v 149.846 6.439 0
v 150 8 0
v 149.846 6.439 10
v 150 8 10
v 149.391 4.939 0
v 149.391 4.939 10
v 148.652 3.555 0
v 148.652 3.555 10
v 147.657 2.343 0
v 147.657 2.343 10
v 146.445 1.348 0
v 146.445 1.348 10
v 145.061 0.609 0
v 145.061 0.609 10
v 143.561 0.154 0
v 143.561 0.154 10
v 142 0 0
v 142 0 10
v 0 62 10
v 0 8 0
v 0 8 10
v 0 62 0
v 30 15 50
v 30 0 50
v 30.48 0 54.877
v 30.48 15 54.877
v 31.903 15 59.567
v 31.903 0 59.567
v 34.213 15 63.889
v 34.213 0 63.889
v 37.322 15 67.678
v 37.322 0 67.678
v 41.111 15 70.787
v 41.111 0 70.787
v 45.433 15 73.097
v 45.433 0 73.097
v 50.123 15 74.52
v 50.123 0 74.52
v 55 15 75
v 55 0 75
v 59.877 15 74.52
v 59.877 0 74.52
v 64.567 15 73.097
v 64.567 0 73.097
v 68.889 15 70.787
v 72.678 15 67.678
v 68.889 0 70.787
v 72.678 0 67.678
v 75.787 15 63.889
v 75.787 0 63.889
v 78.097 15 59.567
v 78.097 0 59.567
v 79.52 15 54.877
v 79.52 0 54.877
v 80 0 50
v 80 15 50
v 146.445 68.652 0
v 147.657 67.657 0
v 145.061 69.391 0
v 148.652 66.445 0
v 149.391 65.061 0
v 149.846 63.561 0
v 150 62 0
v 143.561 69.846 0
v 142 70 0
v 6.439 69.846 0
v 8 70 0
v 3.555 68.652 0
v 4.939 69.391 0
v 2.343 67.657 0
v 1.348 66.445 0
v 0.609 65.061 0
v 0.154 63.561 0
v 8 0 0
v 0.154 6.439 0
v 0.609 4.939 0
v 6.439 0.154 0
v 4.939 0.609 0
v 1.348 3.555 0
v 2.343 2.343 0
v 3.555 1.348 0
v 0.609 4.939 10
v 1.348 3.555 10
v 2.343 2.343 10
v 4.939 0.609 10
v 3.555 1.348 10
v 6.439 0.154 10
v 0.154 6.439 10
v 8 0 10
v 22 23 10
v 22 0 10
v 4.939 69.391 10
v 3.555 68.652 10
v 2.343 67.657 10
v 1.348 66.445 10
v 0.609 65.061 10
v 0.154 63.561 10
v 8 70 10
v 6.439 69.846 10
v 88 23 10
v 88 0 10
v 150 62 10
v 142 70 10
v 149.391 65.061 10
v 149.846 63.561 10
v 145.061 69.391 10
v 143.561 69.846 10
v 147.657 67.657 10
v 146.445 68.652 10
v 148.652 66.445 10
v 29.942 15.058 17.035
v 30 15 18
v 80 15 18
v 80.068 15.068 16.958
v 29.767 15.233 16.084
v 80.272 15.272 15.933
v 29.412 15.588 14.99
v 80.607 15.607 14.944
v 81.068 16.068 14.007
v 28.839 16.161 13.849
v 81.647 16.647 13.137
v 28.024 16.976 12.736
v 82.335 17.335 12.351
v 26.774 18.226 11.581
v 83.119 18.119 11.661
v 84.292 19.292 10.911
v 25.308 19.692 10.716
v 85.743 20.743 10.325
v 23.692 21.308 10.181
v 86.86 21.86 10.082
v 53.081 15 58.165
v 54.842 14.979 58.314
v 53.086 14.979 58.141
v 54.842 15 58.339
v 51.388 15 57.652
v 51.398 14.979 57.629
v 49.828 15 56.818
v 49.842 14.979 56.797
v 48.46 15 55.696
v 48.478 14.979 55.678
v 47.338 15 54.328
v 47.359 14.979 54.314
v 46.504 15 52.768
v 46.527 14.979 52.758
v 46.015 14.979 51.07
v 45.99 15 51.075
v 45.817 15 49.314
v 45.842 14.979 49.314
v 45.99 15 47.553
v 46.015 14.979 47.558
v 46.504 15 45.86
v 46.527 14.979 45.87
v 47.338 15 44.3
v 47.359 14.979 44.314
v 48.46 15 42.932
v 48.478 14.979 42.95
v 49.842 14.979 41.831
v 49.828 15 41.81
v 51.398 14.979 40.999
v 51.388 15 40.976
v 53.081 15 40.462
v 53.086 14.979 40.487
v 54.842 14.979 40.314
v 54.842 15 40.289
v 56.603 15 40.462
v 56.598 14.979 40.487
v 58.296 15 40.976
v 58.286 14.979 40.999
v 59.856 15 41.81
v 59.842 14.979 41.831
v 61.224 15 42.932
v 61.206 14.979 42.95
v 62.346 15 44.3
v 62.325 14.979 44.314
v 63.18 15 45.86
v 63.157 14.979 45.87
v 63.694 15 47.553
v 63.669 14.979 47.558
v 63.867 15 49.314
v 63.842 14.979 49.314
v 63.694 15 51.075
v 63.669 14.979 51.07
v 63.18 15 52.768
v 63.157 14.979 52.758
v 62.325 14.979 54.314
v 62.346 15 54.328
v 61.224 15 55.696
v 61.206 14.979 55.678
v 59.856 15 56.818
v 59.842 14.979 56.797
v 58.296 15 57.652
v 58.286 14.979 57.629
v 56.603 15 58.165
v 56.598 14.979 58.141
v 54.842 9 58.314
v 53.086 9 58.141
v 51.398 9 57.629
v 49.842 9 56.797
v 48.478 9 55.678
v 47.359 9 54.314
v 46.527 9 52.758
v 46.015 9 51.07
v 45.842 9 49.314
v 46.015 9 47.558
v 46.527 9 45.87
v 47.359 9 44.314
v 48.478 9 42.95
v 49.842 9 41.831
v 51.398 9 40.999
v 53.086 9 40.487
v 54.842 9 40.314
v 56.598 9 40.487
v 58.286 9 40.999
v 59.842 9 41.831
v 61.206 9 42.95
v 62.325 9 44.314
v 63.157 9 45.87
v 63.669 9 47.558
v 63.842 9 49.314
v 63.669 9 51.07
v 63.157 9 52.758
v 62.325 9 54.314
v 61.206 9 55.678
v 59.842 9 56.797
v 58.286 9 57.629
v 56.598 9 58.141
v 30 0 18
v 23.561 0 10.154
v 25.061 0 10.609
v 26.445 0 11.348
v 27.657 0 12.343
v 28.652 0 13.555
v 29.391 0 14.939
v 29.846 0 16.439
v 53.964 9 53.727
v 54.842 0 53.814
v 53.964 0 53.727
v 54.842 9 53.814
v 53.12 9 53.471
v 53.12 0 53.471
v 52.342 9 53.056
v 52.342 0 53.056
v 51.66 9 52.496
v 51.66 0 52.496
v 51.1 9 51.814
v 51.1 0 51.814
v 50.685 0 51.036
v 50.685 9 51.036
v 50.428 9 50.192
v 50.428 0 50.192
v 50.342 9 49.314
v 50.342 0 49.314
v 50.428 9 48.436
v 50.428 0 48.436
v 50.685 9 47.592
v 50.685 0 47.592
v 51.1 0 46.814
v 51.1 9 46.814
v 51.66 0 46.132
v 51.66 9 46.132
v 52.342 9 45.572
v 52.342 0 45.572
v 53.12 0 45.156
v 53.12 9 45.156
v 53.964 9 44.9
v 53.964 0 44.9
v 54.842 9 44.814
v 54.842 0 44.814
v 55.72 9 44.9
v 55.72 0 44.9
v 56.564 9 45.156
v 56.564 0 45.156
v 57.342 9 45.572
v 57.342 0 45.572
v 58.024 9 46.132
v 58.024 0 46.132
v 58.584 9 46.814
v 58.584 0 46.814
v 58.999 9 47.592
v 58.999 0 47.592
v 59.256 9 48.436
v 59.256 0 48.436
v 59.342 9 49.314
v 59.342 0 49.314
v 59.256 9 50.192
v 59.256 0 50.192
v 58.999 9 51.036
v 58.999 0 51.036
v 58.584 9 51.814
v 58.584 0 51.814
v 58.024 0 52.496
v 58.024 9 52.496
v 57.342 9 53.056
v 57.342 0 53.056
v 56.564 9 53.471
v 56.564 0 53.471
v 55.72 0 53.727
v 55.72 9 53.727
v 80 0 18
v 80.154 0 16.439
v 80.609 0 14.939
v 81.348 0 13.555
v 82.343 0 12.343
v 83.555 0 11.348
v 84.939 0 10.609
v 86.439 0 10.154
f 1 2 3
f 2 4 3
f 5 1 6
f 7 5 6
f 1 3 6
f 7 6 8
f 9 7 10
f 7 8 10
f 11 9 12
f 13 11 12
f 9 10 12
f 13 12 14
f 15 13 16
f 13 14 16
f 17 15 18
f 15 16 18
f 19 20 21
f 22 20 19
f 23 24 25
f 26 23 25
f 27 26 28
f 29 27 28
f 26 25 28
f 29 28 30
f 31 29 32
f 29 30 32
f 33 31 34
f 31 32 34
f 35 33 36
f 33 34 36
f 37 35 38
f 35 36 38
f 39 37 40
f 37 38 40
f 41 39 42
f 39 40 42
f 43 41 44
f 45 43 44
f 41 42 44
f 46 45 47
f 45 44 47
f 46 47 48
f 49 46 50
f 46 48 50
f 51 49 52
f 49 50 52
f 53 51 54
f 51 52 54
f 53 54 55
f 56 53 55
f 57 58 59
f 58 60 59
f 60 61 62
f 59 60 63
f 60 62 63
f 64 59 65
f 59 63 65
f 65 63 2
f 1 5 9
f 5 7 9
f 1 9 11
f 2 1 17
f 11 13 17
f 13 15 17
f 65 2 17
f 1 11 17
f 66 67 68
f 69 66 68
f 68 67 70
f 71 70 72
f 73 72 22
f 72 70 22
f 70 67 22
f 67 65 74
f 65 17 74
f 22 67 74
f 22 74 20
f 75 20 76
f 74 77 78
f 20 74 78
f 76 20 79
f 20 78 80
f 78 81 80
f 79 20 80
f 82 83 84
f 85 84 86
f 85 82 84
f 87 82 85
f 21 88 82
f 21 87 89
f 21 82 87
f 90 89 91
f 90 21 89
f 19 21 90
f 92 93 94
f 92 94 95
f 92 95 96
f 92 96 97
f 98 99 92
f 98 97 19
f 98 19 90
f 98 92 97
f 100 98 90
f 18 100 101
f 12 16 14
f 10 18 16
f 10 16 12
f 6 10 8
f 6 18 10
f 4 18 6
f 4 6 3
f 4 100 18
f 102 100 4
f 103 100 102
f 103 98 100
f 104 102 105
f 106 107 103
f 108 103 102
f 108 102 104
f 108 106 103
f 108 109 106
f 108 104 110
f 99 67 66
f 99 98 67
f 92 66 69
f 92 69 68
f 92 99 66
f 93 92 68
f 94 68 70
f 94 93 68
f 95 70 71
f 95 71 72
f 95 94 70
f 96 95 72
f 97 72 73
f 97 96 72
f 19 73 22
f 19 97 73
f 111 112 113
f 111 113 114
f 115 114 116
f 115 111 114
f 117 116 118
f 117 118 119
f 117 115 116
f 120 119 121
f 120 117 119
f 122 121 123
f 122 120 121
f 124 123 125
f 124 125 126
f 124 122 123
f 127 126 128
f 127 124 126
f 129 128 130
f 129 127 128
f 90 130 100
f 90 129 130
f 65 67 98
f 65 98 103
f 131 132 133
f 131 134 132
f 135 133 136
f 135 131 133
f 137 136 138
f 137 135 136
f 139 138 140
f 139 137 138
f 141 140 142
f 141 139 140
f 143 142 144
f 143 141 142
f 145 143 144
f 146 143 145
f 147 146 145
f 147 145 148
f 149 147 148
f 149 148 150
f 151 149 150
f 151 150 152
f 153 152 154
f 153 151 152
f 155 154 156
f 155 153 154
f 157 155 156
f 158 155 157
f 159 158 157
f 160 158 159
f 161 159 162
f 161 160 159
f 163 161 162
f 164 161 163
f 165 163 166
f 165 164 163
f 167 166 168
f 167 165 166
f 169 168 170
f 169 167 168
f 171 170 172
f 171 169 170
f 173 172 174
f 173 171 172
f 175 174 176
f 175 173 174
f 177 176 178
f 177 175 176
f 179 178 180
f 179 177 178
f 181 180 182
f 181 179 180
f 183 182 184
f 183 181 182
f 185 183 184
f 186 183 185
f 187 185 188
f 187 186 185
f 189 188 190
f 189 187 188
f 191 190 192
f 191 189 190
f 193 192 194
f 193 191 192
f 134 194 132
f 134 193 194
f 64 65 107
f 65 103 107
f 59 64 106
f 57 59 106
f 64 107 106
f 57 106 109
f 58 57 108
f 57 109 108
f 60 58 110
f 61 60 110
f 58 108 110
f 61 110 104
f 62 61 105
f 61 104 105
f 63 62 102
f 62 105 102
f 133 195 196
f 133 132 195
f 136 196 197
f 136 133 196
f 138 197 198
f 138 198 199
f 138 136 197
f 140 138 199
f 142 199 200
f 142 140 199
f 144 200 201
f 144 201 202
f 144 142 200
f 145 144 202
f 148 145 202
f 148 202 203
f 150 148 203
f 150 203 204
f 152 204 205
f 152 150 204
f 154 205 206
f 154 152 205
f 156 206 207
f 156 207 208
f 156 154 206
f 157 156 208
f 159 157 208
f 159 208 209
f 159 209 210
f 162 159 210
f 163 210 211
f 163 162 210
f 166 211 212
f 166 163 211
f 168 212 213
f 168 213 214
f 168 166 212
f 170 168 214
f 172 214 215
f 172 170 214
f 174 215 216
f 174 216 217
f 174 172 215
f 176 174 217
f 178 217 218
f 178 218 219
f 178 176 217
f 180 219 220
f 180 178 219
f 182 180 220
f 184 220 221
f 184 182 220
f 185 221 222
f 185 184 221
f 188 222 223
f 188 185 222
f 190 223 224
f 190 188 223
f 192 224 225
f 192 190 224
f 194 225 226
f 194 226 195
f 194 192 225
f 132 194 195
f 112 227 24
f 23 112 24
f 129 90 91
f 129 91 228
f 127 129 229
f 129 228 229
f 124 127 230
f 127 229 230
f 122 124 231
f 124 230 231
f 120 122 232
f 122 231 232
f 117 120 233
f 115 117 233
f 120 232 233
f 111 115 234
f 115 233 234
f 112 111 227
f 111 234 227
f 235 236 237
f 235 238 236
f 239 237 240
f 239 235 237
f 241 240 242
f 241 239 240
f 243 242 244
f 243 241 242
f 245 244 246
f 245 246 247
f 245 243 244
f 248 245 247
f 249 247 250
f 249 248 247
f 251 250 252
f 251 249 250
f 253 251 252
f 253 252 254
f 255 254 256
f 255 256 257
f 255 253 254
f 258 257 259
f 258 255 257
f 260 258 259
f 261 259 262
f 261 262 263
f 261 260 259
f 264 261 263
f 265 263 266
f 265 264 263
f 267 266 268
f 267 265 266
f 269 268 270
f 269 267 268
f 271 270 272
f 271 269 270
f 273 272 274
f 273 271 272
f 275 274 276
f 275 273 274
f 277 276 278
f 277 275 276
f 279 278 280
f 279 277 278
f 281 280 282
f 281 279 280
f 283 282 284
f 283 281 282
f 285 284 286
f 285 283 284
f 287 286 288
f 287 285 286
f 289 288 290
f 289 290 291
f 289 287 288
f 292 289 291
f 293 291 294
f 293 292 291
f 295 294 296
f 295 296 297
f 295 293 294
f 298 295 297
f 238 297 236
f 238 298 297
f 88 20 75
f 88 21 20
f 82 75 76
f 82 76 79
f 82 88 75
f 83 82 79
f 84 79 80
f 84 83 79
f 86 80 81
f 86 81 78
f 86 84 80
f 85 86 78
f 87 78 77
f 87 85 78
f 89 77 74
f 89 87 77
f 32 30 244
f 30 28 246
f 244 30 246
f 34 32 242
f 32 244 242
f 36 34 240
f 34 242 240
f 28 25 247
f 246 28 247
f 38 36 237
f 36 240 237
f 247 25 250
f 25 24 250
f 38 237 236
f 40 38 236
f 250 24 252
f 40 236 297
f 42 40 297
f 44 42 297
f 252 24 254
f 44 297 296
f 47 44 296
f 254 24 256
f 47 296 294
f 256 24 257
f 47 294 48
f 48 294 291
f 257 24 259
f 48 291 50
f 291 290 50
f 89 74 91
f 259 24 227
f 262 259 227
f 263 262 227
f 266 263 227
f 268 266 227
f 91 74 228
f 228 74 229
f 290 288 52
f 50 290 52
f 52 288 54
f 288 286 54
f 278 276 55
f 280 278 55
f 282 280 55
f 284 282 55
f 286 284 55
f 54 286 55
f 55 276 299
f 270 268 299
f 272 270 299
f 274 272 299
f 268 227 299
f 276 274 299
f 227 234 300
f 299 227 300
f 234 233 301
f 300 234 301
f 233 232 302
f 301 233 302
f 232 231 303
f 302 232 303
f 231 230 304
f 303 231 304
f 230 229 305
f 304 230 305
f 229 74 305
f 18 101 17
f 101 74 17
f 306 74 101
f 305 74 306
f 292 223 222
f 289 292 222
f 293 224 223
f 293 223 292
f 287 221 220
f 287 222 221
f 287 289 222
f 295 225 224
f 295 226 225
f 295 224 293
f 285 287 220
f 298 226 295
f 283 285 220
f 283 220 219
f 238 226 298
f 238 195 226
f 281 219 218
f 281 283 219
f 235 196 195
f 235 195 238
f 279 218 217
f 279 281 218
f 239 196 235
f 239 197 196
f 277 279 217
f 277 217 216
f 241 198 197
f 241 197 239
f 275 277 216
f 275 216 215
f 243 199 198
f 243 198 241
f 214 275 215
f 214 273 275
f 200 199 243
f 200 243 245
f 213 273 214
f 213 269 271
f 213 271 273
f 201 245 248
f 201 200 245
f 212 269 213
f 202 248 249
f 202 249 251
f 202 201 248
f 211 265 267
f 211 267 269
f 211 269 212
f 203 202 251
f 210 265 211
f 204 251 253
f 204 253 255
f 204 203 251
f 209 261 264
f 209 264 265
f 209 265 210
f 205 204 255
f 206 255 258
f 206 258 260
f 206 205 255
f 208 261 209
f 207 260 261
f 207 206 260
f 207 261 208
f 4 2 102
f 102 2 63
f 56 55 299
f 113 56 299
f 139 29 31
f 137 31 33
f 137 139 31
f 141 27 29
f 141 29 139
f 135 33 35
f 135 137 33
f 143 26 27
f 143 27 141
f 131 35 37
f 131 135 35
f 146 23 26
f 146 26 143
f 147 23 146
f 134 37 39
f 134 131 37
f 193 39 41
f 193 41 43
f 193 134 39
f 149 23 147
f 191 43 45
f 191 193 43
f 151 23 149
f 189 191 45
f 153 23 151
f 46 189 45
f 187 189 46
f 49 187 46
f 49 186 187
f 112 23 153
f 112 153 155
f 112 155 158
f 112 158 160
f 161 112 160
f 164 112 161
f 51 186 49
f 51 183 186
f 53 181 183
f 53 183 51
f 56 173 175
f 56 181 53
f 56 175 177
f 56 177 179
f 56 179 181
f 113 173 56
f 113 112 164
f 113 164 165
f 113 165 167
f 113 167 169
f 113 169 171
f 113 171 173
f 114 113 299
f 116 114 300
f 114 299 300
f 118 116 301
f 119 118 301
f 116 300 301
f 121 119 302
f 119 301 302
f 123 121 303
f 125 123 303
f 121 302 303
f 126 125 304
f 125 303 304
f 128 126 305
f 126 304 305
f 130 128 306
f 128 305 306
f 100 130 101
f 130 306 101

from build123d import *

# Parameters (mm, degrees)
SKETCH1_W           = 150
SKETCH1_H           = 70
BOSS_EXTRUDE1_DEPTH = 10
BOSS_EXTRUDE2_DEPTH = 15
FILLET1_R           = 8
FILLET2_R           = 8
FILLET3_R           = 8
FILLET4_R           = 8
FILLET5_R           = 8
FILLET6_R           = 8
FILLET11_R          = 8


with BuildPart() as part:
    # Sketch1 → Boss-Extrude1 (new body)
    with BuildSketch(Plane.XY):
        with Locations((75, 35)):
            Rectangle(SKETCH1_W, SKETCH1_H)
    extrude(amount=BOSS_EXTRUDE1_DEPTH)

    # Sketch2 → Boss-Extrude2 (add)
    with BuildSketch(Plane(origin=(0, 0, 0), x_dir=(-1, 0, 0), z_dir=(0, -1, 0))):
        with BuildLine():
            Line((-80, -50), (-80, 0))
            Line((-80, 0), (-30, 0))
            Line((-30, 0), (-30, -50))
            ThreePointArc((-30, -50), (-55, -75), (-80, -50))
        make_face()
    extrude(amount=-BOSS_EXTRUDE2_DEPTH)

    # Fillet1
    fillet1_edges = [part.edges().sort_by_distance(p)[0] for p in [
        (80, 7.5, 10),
    ]]
    fillet(fillet1_edges, radius=FILLET1_R)

    # Fillet2
    fillet2_edges = [part.edges().sort_by_distance(p)[0] for p in [
        (55, 15, 10),
    ]]
    fillet(fillet2_edges, radius=FILLET2_R)

    # Fillet3
    fillet3_edges = [part.edges().sort_by_distance(p)[0] for p in [
        (30, 7.5, 10),
    ]]
    fillet(fillet3_edges, radius=FILLET3_R)

    # Fillet4
    fillet4_edges = [part.edges().sort_by_distance(p)[0] for p in [
        (150, 70, 5),
    ]]
    fillet(fillet4_edges, radius=FILLET4_R)

    # Fillet5
    fillet5_edges = [part.edges().sort_by_distance(p)[0] for p in [
        (150, 0, 5),
    ]]
    fillet(fillet5_edges, radius=FILLET5_R)

    # Fillet6
    fillet6_edges = [part.edges().sort_by_distance(p)[0] for p in [
        (0, 70, 5),
    ]]
    fillet(fillet6_edges, radius=FILLET6_R)

    # Fillet11
    fillet11_edges = [part.edges().sort_by_distance(p)[0] for p in [
        (0, 0, 5),
    ]]
    fillet(fillet11_edges, radius=FILLET11_R)

    # Sketch4 → CBORE for M8 Pan Head Machine Screw1 (revolve, cut)
    with BuildSketch(Plane(origin=(54.842028673, 15, 49.313893032), x_dir=(0, 0, 1), z_dir=(1, 0, 0))):
        Polygon((0, 0), (0, 15), (4.5, 15), (4.5, 6), (9, 6), (9, 0.020977491), (9.025, 0), align=None)
    revolve(axis=Axis((54.842028673, 21.35, 49.313893032), (0, -1, 0)), mode=Mode.SUBTRACT)


solid = part.part
